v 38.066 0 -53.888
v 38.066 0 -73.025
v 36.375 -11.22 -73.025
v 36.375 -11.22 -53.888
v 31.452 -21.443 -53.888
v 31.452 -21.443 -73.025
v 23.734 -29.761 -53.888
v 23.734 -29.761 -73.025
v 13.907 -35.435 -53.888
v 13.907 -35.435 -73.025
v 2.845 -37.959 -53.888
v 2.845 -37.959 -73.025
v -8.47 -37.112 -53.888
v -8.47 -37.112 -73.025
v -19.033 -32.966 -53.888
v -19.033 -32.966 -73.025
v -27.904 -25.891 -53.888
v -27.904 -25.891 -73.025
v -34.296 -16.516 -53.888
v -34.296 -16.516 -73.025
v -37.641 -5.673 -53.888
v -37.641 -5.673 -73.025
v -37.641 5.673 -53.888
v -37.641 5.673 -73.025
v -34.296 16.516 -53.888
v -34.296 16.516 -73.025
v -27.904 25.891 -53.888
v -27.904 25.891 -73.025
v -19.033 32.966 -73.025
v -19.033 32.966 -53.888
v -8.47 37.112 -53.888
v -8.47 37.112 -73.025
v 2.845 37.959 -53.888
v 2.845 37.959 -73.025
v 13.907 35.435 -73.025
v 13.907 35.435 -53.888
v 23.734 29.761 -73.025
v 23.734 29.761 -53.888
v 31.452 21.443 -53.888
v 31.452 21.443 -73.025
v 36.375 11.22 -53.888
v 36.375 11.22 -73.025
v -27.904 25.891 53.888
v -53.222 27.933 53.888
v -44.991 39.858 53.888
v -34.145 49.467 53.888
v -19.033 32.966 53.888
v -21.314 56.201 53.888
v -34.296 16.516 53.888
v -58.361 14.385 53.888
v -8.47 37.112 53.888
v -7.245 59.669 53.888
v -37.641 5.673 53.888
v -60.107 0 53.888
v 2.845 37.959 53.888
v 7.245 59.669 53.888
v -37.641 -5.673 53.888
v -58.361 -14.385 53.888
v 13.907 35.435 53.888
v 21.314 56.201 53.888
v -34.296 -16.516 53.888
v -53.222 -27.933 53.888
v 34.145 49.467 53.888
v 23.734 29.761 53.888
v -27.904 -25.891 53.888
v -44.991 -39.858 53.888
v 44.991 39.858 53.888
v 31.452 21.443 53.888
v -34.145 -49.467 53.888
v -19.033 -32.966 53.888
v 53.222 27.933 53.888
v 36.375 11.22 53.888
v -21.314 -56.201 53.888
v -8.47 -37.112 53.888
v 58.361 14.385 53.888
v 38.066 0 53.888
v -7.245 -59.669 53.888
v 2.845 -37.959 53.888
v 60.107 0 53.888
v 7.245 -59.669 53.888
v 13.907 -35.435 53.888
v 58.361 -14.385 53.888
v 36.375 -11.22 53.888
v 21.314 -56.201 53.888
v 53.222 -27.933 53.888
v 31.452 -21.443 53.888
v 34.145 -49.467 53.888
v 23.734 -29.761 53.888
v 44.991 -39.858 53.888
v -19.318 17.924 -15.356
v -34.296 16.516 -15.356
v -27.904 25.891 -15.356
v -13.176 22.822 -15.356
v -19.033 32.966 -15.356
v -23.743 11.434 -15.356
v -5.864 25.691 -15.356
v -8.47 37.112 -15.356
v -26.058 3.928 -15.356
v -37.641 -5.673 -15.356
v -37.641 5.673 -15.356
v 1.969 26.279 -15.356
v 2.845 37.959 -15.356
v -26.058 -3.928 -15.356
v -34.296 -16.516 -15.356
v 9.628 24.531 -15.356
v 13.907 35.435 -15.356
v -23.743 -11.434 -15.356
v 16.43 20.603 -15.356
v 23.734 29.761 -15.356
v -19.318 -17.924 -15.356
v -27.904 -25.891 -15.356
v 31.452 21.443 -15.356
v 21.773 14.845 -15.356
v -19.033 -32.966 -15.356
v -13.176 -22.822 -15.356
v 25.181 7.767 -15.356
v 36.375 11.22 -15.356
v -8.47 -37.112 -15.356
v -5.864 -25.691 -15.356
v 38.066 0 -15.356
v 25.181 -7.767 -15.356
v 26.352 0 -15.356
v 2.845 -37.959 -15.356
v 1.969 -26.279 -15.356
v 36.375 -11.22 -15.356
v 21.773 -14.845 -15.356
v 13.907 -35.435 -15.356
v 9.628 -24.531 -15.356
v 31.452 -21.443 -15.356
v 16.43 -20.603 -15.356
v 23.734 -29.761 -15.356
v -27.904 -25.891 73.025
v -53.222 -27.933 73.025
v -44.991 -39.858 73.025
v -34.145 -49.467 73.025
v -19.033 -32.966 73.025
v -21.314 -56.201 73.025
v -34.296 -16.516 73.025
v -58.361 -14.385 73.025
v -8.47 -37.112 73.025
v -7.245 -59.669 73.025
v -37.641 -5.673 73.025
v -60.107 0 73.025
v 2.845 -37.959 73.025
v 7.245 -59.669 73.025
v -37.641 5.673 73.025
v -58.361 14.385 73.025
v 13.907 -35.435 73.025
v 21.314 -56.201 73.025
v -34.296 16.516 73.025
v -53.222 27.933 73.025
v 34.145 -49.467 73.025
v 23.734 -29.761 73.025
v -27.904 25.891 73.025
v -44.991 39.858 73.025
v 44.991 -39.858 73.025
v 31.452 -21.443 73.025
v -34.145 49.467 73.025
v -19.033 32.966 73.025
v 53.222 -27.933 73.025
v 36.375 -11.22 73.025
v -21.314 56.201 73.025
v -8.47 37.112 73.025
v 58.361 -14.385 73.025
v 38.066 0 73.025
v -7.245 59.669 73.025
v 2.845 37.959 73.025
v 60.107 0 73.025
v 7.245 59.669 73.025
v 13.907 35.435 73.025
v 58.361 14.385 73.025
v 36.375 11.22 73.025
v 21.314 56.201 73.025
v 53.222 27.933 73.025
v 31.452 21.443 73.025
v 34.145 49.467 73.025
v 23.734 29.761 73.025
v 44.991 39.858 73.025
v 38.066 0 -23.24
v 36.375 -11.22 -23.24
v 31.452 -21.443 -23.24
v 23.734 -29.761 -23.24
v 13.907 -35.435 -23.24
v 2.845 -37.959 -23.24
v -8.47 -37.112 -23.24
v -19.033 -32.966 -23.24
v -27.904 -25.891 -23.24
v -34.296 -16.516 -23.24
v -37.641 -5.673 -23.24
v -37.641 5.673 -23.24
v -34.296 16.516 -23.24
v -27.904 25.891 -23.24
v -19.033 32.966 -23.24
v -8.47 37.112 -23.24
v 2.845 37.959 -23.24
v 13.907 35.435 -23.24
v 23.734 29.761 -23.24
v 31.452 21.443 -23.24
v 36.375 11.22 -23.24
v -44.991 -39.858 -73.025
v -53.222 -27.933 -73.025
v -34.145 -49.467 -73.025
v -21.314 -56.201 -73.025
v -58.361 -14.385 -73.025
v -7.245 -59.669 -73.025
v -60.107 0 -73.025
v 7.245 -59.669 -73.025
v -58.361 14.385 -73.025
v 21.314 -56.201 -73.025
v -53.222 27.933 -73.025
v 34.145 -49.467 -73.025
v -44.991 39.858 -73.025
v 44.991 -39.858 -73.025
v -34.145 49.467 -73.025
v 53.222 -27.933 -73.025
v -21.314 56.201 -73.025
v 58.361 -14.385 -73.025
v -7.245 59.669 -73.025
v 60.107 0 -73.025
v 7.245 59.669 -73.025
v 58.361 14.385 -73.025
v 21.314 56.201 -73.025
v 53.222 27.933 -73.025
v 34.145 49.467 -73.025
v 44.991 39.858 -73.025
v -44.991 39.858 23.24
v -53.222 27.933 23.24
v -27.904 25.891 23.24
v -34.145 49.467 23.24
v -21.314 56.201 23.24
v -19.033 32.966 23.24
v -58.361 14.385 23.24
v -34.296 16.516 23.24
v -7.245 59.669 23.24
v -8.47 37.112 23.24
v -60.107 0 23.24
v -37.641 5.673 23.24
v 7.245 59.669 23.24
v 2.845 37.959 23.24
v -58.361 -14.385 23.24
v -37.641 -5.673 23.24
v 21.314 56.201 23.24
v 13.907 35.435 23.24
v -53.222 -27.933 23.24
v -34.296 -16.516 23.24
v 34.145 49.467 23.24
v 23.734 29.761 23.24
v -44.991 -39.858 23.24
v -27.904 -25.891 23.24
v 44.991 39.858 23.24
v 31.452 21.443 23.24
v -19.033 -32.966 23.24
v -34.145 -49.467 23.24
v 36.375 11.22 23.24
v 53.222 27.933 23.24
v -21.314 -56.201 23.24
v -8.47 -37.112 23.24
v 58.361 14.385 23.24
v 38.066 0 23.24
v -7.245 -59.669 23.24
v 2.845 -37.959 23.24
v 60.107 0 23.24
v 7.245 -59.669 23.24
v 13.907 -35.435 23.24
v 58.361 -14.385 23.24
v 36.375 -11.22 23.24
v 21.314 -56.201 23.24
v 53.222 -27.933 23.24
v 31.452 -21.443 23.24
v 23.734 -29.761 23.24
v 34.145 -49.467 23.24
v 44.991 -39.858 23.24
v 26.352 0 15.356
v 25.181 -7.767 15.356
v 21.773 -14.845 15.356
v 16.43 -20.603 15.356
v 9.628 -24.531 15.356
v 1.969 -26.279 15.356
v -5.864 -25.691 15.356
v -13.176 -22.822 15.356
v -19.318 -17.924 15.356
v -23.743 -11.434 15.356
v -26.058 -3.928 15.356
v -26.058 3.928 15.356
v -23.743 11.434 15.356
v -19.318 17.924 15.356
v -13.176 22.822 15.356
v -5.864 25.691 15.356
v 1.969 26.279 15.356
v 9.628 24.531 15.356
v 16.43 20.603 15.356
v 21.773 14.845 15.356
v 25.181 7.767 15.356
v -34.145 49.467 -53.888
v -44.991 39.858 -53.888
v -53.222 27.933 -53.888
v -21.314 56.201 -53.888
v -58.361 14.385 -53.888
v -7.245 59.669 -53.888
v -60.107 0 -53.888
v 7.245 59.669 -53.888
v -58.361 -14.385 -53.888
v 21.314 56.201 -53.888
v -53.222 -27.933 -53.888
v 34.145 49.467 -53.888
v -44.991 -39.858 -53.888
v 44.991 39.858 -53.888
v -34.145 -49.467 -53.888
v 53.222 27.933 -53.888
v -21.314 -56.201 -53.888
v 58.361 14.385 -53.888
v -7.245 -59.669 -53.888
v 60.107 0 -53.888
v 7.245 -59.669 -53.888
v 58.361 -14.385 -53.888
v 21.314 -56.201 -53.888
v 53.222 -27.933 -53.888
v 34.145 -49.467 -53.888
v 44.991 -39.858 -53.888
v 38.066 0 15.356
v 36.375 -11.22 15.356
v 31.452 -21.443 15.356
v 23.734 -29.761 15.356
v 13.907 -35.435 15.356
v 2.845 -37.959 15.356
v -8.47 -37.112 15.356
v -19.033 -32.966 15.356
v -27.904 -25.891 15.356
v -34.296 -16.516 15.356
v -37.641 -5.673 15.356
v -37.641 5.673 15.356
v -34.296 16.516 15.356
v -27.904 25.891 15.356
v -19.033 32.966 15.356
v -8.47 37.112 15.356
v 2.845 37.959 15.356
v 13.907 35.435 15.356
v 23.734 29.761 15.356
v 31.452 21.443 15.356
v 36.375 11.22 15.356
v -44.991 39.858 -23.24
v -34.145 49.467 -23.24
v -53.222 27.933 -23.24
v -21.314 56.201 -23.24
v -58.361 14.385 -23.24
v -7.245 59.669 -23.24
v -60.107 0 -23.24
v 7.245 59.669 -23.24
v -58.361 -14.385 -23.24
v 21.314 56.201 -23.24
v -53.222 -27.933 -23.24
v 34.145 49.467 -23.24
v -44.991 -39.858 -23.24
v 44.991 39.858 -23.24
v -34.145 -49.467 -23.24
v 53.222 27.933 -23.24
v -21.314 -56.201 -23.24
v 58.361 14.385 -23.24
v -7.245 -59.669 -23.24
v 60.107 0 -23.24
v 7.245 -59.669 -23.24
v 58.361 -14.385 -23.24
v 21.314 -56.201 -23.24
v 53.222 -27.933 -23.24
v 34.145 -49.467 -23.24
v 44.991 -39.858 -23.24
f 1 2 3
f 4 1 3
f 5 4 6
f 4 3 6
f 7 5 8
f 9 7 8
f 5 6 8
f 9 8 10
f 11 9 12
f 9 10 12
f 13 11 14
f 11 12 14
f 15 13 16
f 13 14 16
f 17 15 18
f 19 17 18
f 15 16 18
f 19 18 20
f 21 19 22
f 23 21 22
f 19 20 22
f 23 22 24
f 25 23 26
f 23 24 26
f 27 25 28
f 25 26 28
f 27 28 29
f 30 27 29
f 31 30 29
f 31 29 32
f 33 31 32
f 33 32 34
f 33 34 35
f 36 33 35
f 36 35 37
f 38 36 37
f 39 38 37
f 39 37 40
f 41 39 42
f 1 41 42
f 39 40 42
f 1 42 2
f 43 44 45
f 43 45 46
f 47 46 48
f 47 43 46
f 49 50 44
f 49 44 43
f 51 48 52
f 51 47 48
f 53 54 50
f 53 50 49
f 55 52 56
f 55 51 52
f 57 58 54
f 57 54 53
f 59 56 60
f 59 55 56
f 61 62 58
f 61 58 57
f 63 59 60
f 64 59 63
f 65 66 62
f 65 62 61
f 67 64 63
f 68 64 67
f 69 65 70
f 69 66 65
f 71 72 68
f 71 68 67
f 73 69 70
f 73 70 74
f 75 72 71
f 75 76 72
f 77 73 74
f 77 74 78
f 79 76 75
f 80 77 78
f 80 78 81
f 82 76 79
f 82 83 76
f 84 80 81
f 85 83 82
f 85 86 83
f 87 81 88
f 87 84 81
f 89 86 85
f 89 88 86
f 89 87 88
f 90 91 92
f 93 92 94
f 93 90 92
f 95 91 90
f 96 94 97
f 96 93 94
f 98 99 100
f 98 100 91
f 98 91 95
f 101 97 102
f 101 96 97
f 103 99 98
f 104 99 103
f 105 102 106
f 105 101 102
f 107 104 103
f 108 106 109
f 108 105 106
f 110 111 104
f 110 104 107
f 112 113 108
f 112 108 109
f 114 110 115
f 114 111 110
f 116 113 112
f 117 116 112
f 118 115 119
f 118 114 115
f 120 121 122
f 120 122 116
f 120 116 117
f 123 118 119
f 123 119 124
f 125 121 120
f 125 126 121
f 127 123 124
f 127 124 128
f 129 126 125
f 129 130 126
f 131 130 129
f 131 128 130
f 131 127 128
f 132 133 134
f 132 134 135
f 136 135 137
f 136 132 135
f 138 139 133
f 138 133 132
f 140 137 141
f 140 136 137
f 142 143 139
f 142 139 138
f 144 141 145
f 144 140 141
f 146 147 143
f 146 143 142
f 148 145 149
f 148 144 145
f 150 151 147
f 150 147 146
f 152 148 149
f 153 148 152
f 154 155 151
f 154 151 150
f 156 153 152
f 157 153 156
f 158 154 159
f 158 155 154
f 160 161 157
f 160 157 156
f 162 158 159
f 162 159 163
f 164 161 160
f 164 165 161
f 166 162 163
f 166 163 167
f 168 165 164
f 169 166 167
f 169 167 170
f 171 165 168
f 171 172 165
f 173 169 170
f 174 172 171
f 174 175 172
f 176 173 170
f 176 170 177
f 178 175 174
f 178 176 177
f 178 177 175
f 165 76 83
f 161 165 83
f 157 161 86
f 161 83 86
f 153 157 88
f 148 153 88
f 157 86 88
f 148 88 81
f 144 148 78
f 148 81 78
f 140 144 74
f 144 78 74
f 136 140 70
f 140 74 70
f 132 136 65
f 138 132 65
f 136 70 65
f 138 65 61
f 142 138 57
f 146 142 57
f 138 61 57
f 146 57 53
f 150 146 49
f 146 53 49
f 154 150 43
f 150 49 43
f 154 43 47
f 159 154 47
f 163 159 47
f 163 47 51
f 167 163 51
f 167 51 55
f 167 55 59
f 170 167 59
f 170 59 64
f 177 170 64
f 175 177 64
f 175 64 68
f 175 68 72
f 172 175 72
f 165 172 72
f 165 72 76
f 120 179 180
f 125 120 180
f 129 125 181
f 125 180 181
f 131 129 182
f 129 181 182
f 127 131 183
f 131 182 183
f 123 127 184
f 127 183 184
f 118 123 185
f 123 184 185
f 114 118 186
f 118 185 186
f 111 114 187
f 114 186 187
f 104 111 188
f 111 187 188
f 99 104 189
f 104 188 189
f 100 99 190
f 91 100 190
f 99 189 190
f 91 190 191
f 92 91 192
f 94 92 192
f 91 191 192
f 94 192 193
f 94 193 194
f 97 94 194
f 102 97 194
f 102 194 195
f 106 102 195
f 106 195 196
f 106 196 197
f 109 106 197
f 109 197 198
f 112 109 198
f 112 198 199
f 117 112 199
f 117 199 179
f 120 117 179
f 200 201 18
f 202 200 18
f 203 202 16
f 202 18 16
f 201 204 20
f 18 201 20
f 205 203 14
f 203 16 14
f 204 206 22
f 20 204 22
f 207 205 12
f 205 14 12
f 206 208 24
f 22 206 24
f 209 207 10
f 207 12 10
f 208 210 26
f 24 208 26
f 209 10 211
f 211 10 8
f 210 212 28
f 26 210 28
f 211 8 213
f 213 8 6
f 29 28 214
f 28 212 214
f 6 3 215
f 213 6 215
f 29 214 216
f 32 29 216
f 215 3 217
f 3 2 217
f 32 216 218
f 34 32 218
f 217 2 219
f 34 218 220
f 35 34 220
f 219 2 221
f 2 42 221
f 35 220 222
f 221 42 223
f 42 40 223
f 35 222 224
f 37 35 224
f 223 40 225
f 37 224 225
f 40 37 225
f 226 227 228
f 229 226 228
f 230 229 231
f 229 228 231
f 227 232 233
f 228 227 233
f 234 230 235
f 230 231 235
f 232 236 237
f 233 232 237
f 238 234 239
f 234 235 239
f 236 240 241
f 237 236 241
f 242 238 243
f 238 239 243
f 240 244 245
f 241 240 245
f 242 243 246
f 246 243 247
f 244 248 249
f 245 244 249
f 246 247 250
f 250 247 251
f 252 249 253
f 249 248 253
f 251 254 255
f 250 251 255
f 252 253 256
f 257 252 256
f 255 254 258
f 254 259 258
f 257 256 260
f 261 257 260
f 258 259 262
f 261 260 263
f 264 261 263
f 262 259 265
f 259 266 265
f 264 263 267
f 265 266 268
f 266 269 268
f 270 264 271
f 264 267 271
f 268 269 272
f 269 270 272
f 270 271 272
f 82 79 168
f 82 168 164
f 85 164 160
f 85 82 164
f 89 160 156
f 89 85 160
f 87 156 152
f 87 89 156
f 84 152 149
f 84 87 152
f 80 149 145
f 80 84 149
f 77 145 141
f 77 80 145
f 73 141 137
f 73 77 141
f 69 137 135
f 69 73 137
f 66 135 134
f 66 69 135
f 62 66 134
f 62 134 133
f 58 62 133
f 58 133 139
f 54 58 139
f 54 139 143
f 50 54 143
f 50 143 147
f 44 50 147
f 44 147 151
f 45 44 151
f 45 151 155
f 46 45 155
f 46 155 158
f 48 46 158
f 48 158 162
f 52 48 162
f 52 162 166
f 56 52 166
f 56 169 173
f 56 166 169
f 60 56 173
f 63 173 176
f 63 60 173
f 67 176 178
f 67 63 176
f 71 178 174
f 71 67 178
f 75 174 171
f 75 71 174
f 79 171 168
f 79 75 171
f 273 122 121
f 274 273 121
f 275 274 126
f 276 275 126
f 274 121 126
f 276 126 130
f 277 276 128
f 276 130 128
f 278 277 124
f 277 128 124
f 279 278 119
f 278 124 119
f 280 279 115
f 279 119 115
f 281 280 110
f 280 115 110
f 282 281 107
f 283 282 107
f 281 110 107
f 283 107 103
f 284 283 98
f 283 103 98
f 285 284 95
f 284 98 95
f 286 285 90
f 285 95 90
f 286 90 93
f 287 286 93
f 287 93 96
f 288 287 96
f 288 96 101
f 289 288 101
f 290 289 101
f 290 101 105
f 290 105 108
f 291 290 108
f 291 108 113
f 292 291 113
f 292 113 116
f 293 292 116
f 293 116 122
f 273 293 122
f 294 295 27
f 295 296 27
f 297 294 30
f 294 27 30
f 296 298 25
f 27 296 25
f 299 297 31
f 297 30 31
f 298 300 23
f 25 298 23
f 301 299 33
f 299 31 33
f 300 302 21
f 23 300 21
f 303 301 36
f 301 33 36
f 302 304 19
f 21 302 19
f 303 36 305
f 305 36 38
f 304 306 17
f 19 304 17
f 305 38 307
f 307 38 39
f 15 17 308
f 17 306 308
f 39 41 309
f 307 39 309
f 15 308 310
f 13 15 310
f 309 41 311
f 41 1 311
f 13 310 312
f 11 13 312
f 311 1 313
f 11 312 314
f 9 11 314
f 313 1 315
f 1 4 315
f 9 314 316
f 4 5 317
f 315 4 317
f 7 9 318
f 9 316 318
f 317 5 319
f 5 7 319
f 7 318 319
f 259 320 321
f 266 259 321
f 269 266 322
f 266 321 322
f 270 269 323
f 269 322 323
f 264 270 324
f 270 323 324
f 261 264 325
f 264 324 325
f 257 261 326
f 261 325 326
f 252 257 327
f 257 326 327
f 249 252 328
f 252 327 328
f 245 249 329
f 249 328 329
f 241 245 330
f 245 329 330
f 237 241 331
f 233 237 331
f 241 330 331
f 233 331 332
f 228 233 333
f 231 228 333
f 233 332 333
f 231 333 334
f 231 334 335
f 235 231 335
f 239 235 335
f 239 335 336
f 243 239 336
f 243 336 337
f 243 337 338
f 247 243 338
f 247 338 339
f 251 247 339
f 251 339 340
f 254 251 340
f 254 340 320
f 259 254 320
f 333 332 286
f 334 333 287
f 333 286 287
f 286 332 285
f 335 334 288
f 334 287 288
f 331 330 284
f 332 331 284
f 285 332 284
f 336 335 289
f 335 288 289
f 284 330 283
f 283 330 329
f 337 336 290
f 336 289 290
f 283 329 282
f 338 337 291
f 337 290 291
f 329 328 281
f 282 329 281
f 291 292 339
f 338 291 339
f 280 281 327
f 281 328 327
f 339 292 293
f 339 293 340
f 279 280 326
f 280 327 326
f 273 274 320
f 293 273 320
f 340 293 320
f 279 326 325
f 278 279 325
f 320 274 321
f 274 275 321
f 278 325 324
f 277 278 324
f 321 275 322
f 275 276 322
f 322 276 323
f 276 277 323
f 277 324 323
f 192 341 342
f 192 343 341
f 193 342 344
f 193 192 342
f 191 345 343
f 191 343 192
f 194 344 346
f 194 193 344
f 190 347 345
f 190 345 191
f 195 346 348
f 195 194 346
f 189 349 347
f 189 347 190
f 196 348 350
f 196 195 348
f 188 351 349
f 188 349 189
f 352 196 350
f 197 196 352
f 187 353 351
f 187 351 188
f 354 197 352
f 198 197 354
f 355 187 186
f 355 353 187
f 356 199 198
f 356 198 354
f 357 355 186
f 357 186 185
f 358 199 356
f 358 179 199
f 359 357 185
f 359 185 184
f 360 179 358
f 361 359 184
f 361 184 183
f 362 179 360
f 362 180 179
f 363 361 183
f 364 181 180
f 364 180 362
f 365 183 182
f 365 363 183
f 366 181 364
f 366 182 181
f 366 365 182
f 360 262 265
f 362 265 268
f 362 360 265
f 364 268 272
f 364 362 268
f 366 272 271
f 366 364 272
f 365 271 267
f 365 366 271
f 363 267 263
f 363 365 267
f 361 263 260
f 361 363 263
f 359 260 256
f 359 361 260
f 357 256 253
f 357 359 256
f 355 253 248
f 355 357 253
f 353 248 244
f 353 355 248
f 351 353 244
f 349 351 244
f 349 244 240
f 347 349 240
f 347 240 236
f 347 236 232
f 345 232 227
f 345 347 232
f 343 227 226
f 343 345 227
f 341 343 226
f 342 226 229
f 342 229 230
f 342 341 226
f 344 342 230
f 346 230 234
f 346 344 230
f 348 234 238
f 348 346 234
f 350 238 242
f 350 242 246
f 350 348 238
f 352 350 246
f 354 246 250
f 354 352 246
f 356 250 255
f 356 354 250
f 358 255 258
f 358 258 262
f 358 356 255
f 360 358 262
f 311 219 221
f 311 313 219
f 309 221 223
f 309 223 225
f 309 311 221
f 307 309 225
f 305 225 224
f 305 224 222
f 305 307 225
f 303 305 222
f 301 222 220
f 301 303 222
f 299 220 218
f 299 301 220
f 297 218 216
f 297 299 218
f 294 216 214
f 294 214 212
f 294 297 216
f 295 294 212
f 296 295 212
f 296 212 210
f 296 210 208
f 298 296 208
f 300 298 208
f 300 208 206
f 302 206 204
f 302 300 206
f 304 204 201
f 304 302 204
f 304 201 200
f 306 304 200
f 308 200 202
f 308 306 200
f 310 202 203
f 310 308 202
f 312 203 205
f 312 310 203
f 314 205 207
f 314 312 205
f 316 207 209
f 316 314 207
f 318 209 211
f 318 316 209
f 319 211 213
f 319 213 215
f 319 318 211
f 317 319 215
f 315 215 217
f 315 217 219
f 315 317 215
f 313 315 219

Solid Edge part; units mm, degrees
sketch "Sketch1" plane through (0, 0, 0) normal (0, 0, 1) x (1, 0, 0)
  circle A0 centre (0, 0) radius 60.1072
extrude "Protrusion1" add sketch "Sketch1" along normal mid plane 146.05
sketch "Sketch2" plane through (0, 0, 0) normal (0, -1, 0) x (1, 0, 0)
  line L0 (38.0659, -53.888) -> (38.0659, -73.025)
  line L1 (73.4759, -53.888) -> (38.0659, -53.888)
  line L2 (73.4759, -23.2402) -> (73.4759, -53.888)
  line L3 (38.0659, -23.2402) -> (73.4759, -23.2402)
  line L4 (38.0659, -15.3559) -> (38.0659, -23.2402)
  line L5 (26.3522, -15.3559) -> (38.0659, -15.3559)
  line L6 (26.3522, 15.3559) -> (26.3522, -15.3559)
  line L7 (38.0659, 15.3559) -> (26.3522, 15.3559)
  line L8 (38.0659, 23.2402) -> (38.0659, 15.3559)
  line L9 (73.4759, 23.2402) -> (38.0659, 23.2402)
  line L10 (73.4759, 53.888) -> (73.4759, 23.2402)
  line L11 (38.0659, 53.888) -> (73.4759, 53.888)
  line L12 (38.0659, 73.025) -> (38.0659, 53.888)
revolve "RevolvedCutout1" cut sketch "Sketch2" angle 360 about axis through (0, 0, 73.025) along (0, 0, -1) material side at (38.0159, 0, -63.4565)
